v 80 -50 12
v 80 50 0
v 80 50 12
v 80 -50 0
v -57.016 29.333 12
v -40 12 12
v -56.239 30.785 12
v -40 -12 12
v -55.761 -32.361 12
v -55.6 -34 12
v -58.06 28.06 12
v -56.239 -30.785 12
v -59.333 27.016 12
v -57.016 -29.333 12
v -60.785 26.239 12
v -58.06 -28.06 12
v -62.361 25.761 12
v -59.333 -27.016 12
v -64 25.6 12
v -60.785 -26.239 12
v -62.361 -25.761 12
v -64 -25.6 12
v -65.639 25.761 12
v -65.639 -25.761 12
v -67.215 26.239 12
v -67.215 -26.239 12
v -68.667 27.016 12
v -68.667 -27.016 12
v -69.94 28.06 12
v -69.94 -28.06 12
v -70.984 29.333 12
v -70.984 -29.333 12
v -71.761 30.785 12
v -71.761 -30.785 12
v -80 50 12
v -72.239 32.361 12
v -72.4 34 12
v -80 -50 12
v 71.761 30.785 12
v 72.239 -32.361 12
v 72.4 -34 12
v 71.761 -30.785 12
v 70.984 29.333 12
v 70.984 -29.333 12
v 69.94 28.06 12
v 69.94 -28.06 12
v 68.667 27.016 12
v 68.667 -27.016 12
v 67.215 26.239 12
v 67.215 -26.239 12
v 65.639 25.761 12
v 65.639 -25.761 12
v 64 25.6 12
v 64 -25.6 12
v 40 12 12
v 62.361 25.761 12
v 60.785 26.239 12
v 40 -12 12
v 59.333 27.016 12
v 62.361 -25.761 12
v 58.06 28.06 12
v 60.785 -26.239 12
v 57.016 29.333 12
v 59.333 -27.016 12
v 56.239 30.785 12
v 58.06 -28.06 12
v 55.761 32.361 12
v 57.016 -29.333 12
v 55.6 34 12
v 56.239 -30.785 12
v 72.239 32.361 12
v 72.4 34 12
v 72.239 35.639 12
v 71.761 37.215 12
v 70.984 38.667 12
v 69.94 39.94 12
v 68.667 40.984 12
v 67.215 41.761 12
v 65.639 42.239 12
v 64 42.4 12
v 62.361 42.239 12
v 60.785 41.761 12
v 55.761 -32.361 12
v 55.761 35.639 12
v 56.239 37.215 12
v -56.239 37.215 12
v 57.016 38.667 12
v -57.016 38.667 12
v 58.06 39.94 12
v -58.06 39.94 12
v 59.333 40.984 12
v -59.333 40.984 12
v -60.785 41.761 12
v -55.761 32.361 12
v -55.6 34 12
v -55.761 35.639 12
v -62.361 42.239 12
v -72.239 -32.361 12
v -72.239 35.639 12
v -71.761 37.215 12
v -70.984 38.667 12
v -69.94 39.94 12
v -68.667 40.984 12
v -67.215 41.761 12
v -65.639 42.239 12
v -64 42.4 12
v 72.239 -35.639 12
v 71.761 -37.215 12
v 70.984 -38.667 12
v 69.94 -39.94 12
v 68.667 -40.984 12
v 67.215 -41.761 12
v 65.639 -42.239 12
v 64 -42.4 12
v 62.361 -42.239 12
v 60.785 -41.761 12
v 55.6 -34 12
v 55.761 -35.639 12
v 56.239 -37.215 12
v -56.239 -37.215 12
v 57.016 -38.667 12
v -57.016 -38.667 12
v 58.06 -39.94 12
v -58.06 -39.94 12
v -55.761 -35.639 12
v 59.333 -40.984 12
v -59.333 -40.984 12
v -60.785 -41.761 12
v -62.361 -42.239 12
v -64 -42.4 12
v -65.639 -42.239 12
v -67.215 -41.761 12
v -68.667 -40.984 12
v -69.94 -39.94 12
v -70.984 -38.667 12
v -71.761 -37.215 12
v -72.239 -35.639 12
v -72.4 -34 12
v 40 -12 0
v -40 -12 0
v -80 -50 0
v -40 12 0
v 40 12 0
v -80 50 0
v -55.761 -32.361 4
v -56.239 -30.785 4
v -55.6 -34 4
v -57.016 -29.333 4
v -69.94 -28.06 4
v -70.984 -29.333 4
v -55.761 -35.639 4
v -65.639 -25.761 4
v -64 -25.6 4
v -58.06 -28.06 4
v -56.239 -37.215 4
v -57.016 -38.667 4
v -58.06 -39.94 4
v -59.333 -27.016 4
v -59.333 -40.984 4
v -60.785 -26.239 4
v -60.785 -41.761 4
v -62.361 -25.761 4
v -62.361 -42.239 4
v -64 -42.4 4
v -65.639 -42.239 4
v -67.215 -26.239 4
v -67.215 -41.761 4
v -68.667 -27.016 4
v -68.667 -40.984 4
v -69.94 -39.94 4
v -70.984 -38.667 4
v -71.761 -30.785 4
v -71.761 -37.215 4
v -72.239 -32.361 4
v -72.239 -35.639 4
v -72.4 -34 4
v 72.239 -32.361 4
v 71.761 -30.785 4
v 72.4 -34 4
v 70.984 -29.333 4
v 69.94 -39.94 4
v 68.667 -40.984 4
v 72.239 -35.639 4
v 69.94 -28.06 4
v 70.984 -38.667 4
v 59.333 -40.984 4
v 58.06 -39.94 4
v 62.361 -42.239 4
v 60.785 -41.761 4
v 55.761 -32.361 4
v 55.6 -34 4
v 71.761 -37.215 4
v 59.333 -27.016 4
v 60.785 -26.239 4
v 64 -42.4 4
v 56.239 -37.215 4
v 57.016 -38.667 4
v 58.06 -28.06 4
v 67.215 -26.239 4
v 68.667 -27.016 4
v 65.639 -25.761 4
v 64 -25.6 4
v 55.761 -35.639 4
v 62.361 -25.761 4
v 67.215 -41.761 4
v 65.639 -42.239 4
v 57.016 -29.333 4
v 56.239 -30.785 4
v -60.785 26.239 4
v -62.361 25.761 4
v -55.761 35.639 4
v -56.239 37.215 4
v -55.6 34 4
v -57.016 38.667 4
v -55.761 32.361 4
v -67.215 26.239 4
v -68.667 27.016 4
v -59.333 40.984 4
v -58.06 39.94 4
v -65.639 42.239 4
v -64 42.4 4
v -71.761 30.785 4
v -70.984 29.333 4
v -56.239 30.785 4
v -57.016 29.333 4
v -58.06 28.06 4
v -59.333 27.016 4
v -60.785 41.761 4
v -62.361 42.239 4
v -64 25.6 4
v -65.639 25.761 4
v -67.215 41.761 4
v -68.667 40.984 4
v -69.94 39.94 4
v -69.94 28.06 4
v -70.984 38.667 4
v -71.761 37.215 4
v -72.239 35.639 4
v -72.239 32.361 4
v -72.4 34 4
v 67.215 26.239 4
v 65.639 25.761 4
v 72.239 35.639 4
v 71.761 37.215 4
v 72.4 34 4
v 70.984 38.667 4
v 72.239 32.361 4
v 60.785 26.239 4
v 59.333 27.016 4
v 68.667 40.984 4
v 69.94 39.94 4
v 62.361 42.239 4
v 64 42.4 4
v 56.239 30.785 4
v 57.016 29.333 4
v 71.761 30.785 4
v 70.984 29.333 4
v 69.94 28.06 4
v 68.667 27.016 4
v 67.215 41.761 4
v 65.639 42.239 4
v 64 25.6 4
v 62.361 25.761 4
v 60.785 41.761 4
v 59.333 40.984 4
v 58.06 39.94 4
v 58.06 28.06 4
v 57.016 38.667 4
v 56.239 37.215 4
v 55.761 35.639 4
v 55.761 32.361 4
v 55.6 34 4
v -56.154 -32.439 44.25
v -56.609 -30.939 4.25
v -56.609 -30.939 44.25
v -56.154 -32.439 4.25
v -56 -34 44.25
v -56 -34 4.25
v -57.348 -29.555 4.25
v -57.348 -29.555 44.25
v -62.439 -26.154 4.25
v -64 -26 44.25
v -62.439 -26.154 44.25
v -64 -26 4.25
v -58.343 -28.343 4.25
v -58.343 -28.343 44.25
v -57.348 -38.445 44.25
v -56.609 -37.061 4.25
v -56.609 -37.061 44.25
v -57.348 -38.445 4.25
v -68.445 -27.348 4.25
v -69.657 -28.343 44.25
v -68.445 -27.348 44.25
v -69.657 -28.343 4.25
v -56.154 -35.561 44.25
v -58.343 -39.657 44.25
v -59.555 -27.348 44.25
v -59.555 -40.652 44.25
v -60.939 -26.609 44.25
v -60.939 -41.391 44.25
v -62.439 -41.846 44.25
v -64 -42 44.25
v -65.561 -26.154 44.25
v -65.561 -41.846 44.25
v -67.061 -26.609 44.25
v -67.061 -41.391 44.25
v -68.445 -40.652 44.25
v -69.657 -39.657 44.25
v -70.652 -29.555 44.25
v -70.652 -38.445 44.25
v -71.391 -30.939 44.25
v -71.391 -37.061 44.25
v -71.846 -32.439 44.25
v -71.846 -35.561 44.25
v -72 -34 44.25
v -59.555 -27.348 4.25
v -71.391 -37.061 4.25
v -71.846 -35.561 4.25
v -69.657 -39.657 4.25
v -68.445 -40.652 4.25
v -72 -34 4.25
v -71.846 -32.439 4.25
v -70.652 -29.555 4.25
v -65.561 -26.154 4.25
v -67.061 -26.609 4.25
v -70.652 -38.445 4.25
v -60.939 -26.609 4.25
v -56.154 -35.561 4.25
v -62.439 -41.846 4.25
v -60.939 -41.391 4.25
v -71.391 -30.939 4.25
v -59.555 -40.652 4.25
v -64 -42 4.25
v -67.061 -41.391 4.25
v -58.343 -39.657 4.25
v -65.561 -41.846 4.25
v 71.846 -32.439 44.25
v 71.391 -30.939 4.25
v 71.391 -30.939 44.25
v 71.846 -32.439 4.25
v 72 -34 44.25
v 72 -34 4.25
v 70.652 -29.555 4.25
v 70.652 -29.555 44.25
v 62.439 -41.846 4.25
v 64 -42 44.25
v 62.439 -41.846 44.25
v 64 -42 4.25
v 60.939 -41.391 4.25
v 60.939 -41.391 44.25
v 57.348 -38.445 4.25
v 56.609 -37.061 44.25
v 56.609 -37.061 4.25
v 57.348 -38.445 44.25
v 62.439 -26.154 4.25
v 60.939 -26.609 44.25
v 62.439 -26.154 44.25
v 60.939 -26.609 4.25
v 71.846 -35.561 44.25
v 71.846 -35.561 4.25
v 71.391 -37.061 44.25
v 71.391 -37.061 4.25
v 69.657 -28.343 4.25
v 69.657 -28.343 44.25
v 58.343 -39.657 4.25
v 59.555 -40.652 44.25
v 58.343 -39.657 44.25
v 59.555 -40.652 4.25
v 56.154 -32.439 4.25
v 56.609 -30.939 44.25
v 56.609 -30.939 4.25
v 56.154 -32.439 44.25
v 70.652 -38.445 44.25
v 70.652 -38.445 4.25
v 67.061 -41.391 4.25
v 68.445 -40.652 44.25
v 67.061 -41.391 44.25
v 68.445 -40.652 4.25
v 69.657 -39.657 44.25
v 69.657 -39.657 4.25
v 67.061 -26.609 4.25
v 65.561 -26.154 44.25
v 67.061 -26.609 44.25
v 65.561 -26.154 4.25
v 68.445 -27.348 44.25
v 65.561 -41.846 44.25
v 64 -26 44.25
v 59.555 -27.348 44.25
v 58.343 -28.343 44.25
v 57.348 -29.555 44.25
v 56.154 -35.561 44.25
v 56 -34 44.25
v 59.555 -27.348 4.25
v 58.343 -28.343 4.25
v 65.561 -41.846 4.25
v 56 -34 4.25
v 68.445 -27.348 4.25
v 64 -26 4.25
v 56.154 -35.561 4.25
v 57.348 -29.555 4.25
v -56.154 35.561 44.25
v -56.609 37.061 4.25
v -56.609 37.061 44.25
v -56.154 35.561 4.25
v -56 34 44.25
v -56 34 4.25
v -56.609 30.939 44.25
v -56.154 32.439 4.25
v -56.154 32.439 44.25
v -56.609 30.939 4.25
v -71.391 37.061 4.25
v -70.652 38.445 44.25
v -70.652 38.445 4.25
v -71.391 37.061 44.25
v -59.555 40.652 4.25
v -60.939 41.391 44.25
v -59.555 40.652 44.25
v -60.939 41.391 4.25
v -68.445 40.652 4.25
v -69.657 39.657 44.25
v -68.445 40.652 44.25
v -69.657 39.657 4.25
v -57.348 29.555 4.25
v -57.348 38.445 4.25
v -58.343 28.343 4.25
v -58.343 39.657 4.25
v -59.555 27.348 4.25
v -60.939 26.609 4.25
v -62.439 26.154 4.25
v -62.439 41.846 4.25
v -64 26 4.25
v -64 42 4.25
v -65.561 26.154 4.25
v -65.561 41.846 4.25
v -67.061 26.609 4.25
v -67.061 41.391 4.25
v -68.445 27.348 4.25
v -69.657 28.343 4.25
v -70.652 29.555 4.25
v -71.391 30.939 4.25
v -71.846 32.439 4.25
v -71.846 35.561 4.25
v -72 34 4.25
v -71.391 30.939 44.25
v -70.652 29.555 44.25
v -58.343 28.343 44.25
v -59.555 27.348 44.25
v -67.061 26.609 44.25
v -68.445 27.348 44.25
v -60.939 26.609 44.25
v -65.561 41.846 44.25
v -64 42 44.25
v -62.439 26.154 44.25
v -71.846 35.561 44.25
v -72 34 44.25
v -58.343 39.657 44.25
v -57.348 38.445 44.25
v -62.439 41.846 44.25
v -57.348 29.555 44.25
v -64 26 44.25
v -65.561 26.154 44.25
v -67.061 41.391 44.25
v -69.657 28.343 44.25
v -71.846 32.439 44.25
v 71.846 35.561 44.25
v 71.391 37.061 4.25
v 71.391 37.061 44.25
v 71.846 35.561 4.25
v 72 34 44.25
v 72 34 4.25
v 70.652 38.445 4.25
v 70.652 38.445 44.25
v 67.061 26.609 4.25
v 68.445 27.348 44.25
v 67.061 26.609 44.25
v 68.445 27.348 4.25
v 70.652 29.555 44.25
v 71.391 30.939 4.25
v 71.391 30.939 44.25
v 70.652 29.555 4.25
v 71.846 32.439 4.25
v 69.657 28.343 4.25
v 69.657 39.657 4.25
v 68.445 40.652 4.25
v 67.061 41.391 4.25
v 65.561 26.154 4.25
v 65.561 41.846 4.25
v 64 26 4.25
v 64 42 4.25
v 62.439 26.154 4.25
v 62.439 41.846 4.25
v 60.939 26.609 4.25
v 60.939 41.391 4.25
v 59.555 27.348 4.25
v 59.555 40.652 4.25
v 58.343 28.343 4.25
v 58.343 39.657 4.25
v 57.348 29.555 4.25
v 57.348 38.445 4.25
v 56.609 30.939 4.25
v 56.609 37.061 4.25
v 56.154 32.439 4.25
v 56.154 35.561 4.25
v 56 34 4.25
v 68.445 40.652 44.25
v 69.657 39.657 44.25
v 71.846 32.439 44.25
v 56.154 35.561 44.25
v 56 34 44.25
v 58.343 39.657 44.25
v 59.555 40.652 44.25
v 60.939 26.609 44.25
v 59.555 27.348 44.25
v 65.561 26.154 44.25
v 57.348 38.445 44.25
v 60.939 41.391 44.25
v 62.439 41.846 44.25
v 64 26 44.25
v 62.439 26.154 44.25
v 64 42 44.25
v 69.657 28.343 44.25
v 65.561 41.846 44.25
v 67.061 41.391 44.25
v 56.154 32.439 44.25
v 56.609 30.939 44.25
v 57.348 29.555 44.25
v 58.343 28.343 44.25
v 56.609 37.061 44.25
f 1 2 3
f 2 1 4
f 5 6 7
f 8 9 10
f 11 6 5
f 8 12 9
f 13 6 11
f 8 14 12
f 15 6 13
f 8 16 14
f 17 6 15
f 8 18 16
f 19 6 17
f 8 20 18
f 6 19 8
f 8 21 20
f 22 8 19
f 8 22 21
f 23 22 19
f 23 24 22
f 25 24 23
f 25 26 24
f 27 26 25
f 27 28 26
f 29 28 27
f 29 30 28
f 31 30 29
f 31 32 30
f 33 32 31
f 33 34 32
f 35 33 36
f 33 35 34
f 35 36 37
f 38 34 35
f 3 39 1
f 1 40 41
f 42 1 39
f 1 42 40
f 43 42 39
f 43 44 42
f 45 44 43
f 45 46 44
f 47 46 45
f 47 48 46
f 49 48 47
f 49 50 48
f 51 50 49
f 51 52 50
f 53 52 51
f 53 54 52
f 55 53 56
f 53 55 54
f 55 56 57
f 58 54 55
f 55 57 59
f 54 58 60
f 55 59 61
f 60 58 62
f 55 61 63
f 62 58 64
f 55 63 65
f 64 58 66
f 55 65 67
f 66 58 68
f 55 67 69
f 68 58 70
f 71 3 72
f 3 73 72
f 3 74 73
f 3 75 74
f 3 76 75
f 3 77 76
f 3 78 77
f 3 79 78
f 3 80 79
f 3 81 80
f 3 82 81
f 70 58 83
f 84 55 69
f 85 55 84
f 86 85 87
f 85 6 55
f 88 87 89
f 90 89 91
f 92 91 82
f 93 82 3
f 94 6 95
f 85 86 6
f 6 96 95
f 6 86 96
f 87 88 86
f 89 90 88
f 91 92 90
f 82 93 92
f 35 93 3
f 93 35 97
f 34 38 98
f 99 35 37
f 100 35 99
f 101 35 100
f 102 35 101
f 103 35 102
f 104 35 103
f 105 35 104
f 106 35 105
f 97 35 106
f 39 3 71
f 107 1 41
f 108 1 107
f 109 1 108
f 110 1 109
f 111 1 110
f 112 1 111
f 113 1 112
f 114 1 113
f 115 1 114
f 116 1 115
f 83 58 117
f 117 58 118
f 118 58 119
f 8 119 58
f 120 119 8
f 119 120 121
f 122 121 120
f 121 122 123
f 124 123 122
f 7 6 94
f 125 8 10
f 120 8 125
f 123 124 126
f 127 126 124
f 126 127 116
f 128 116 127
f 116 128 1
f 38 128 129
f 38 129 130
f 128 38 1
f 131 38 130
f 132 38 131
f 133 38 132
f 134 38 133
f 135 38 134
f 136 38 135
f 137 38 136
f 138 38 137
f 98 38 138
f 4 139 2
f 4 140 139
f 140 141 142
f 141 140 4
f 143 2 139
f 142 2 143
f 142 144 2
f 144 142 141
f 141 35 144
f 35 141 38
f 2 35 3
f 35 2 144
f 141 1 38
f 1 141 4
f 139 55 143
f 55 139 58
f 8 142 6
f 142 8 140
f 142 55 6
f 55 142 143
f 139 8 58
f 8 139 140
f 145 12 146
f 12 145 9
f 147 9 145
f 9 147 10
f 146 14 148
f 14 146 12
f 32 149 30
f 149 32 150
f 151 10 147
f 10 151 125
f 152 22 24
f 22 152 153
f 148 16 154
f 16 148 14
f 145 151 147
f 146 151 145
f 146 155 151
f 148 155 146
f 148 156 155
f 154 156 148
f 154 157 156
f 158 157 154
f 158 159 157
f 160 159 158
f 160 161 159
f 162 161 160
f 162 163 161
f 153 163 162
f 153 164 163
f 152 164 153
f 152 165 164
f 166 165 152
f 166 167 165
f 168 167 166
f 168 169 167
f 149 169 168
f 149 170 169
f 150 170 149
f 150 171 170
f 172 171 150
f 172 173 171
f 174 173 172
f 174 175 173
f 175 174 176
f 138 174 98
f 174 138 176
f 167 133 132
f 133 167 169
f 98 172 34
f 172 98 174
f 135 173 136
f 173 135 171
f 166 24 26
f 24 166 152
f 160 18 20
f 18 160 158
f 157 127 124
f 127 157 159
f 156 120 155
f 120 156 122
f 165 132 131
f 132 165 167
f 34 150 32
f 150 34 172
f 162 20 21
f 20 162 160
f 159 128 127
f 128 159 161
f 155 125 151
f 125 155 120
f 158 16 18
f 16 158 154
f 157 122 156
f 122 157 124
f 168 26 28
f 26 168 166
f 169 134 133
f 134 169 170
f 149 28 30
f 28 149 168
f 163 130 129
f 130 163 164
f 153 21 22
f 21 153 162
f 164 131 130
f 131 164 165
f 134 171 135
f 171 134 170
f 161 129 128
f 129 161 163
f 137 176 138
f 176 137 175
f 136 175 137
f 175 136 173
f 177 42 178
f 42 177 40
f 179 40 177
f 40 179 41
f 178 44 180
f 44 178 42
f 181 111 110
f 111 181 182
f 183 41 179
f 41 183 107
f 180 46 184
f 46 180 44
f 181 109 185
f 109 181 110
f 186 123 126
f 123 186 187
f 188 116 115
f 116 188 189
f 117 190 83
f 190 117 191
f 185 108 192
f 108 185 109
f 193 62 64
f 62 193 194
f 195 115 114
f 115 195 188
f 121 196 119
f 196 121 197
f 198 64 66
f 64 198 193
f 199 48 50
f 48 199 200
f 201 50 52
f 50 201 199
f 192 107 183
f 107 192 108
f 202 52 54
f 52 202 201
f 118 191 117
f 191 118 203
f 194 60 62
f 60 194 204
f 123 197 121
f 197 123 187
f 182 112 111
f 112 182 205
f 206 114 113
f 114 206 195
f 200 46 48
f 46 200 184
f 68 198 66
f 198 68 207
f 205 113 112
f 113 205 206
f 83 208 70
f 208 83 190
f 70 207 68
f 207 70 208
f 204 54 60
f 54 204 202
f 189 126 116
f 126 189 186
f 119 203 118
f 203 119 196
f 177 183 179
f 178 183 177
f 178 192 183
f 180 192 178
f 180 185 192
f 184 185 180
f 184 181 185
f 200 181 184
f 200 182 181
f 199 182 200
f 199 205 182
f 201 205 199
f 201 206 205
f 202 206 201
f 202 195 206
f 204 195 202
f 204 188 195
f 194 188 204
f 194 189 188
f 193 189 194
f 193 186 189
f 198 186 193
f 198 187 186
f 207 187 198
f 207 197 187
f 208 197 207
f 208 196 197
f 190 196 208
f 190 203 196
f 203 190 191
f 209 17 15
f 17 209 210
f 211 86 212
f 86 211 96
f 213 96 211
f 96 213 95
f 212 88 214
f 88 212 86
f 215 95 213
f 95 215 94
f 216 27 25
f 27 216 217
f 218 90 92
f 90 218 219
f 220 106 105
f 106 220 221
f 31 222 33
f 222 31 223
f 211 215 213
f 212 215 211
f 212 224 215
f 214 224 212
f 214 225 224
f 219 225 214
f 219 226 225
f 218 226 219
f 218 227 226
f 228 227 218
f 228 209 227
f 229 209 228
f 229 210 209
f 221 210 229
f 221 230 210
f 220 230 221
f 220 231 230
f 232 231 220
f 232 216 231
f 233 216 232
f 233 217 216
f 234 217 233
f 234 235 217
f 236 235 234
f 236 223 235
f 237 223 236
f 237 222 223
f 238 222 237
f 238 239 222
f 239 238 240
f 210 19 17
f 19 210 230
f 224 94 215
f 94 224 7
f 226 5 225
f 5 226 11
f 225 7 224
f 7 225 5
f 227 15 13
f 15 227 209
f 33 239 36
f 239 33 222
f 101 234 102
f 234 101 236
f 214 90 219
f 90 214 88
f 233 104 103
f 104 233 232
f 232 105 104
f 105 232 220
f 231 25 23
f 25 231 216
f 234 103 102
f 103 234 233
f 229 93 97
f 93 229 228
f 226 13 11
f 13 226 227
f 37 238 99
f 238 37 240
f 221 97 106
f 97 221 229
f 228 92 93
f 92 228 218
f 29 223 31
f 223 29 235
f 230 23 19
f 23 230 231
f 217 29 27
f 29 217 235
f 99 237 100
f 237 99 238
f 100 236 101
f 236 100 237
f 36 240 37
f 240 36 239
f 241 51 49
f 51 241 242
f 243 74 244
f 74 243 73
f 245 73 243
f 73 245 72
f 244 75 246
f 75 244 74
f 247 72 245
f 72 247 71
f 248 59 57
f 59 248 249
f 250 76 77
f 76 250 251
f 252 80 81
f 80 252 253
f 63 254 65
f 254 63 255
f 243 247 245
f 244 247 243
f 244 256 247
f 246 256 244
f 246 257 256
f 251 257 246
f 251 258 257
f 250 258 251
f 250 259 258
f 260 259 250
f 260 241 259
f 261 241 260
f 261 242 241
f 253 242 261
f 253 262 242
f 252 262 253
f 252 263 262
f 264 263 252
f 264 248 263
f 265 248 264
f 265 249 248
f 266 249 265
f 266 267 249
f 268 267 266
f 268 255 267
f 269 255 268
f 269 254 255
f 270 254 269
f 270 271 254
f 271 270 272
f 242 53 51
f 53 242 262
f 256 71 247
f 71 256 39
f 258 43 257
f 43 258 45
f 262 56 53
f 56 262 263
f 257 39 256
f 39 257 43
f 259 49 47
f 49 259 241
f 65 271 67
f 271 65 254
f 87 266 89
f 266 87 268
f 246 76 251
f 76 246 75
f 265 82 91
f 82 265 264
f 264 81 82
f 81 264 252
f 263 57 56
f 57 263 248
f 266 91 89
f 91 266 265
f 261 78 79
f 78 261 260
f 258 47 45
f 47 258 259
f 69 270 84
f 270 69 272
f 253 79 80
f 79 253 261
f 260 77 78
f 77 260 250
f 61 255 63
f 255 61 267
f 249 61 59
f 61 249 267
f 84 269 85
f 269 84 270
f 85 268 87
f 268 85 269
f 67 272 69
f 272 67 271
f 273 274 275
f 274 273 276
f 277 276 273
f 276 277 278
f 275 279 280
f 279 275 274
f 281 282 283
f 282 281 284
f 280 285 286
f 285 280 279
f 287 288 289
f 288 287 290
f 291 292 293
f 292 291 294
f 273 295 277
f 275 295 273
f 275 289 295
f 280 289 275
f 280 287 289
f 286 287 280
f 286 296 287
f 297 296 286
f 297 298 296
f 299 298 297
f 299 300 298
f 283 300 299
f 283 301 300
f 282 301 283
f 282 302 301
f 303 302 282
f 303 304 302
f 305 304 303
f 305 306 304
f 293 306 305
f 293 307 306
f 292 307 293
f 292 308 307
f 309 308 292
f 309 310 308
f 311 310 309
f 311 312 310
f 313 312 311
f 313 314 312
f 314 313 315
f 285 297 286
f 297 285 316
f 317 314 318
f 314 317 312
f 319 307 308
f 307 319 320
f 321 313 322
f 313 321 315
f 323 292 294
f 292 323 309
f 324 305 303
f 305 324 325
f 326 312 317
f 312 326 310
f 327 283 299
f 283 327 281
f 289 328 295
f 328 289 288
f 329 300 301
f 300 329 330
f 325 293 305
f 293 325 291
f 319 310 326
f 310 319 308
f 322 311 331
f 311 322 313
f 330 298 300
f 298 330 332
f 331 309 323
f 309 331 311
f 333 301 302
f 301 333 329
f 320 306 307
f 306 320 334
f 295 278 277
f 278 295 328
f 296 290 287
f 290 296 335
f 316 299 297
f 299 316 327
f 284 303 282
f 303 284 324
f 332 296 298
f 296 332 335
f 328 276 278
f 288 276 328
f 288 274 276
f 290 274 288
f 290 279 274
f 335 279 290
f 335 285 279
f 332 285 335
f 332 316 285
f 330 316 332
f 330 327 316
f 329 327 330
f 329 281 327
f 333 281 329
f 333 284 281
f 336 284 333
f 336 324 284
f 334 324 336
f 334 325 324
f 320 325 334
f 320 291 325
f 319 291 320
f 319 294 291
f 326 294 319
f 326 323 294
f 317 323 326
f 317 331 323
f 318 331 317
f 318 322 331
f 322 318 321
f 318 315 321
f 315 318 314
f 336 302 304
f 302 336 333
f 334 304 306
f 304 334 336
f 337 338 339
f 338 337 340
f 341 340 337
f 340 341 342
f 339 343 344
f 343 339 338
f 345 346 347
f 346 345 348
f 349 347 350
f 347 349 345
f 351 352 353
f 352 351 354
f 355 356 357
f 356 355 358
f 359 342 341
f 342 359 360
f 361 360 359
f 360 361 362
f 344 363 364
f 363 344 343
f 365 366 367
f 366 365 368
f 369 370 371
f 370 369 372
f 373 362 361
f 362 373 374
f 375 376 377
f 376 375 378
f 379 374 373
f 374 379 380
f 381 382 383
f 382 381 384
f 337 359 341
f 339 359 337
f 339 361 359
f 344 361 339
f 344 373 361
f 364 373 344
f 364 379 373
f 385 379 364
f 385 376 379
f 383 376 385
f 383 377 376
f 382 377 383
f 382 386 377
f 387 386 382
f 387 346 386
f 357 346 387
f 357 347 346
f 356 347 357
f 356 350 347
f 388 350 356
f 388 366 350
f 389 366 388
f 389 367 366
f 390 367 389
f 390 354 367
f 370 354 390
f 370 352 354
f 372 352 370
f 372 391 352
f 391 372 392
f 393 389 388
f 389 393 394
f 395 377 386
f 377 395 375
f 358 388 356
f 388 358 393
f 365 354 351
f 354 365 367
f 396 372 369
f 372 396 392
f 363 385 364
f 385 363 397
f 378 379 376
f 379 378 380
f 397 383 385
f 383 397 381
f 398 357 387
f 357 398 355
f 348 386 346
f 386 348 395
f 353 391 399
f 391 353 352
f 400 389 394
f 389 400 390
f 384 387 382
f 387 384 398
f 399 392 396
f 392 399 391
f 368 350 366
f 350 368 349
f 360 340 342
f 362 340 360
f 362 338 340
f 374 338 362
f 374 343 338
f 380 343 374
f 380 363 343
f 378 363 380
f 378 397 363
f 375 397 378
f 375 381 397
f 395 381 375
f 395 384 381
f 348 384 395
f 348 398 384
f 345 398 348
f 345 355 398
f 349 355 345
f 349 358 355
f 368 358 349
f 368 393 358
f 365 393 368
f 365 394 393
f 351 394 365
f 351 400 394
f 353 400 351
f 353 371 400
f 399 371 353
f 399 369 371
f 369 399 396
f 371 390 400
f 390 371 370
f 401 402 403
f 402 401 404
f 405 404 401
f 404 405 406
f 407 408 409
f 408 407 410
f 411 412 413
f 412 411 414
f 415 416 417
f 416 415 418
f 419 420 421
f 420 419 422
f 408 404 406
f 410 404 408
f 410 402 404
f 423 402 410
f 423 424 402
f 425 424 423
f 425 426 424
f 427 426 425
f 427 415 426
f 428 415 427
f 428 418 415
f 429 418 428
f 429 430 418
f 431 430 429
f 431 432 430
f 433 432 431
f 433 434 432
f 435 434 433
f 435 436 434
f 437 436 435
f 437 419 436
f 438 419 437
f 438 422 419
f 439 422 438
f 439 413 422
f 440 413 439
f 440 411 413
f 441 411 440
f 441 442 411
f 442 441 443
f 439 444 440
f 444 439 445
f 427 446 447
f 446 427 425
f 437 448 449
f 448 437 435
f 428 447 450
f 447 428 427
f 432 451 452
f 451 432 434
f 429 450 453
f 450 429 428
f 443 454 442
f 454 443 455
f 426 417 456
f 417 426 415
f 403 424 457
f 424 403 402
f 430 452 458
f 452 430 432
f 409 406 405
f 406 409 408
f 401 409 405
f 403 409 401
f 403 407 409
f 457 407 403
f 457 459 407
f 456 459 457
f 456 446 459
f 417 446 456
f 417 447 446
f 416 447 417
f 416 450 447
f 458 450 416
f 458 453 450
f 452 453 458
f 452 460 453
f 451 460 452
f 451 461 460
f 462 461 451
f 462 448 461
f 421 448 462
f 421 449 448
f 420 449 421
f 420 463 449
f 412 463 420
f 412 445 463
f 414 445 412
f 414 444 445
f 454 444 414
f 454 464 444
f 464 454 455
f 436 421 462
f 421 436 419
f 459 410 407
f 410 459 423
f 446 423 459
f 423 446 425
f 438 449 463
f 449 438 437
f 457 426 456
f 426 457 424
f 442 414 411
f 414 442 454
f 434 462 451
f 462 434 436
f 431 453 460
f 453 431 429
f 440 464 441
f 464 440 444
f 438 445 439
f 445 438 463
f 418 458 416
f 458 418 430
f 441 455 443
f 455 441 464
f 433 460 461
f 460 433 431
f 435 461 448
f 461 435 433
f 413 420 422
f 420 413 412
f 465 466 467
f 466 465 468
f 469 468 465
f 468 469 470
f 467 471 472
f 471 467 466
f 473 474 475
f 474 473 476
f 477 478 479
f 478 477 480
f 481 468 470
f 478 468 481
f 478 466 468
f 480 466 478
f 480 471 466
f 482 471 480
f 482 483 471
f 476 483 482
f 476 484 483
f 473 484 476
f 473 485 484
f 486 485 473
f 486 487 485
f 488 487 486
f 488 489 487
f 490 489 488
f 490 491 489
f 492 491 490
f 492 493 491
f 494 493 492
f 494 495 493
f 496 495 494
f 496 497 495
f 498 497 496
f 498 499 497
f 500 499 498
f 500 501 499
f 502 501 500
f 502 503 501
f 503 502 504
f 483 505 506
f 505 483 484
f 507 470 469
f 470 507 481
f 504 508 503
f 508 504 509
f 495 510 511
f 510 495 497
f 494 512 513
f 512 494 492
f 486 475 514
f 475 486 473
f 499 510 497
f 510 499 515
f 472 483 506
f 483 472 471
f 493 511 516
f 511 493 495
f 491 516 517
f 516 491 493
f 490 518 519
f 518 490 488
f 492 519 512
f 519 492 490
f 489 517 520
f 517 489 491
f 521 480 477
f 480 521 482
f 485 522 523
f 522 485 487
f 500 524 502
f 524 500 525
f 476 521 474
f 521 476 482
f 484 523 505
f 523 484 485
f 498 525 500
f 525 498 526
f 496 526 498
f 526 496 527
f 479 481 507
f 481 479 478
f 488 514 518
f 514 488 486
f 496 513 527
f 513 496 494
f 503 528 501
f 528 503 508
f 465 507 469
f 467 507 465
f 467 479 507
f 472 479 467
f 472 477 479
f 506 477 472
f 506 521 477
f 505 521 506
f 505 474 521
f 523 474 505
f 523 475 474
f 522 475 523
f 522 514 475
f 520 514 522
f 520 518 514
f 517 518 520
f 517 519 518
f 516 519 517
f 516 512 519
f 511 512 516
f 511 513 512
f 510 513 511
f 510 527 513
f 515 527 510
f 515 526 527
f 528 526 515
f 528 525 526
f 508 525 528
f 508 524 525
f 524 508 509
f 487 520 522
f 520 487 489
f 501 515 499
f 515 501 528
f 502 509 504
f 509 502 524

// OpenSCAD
$fn = 32;

// ------------------------------------------------------------------------
// Frame with four posts: 160 x 100 mm frame, four d16 posts
// Every part is its own module, assembly() places them once.
// ------------------------------------------------------------------------

// --- part 1 ---
module base_frame() {
  difference() {
    translate([-80, -50, 0]) cube([160, 100, 12]);
    translate([-40, -12, -1]) cube([80, 24, 14]);
    translate([-64, -34, 4]) cylinder(h = 9, d = 16.8);
    translate([64, -34, 4]) cylinder(h = 9, d = 16.8);
    translate([-64, 34, 4]) cylinder(h = 9, d = 16.8);
    translate([64, 34, 4]) cylinder(h = 9, d = 16.8);
  }
}

// --- part 2 ---
module post1() {
  cylinder(h = 40, d = 16);
}

// --- part 3 ---
module post2() {
  cylinder(h = 40, d = 16);
}

// --- part 4 ---
module post3() {
  cylinder(h = 40, d = 16);
}

// --- part 5 ---
module post4() {
  cylinder(h = 40, d = 16);
}

// --- assembly ---
module assembly() {
  translate([0, 0, 0]) rotate([0, 0, 0]) base_frame();
  translate([-64, -34, 4.25]) rotate([0, 0, 0]) post1();
  translate([64, -34, 4.25]) rotate([0, 0, 0]) post2();
  translate([-64, 34, 4.25]) rotate([0, 0, 0]) post3();
  translate([64, 34, 4.25]) rotate([0, 0, 0]) post4();
}

assembly();
